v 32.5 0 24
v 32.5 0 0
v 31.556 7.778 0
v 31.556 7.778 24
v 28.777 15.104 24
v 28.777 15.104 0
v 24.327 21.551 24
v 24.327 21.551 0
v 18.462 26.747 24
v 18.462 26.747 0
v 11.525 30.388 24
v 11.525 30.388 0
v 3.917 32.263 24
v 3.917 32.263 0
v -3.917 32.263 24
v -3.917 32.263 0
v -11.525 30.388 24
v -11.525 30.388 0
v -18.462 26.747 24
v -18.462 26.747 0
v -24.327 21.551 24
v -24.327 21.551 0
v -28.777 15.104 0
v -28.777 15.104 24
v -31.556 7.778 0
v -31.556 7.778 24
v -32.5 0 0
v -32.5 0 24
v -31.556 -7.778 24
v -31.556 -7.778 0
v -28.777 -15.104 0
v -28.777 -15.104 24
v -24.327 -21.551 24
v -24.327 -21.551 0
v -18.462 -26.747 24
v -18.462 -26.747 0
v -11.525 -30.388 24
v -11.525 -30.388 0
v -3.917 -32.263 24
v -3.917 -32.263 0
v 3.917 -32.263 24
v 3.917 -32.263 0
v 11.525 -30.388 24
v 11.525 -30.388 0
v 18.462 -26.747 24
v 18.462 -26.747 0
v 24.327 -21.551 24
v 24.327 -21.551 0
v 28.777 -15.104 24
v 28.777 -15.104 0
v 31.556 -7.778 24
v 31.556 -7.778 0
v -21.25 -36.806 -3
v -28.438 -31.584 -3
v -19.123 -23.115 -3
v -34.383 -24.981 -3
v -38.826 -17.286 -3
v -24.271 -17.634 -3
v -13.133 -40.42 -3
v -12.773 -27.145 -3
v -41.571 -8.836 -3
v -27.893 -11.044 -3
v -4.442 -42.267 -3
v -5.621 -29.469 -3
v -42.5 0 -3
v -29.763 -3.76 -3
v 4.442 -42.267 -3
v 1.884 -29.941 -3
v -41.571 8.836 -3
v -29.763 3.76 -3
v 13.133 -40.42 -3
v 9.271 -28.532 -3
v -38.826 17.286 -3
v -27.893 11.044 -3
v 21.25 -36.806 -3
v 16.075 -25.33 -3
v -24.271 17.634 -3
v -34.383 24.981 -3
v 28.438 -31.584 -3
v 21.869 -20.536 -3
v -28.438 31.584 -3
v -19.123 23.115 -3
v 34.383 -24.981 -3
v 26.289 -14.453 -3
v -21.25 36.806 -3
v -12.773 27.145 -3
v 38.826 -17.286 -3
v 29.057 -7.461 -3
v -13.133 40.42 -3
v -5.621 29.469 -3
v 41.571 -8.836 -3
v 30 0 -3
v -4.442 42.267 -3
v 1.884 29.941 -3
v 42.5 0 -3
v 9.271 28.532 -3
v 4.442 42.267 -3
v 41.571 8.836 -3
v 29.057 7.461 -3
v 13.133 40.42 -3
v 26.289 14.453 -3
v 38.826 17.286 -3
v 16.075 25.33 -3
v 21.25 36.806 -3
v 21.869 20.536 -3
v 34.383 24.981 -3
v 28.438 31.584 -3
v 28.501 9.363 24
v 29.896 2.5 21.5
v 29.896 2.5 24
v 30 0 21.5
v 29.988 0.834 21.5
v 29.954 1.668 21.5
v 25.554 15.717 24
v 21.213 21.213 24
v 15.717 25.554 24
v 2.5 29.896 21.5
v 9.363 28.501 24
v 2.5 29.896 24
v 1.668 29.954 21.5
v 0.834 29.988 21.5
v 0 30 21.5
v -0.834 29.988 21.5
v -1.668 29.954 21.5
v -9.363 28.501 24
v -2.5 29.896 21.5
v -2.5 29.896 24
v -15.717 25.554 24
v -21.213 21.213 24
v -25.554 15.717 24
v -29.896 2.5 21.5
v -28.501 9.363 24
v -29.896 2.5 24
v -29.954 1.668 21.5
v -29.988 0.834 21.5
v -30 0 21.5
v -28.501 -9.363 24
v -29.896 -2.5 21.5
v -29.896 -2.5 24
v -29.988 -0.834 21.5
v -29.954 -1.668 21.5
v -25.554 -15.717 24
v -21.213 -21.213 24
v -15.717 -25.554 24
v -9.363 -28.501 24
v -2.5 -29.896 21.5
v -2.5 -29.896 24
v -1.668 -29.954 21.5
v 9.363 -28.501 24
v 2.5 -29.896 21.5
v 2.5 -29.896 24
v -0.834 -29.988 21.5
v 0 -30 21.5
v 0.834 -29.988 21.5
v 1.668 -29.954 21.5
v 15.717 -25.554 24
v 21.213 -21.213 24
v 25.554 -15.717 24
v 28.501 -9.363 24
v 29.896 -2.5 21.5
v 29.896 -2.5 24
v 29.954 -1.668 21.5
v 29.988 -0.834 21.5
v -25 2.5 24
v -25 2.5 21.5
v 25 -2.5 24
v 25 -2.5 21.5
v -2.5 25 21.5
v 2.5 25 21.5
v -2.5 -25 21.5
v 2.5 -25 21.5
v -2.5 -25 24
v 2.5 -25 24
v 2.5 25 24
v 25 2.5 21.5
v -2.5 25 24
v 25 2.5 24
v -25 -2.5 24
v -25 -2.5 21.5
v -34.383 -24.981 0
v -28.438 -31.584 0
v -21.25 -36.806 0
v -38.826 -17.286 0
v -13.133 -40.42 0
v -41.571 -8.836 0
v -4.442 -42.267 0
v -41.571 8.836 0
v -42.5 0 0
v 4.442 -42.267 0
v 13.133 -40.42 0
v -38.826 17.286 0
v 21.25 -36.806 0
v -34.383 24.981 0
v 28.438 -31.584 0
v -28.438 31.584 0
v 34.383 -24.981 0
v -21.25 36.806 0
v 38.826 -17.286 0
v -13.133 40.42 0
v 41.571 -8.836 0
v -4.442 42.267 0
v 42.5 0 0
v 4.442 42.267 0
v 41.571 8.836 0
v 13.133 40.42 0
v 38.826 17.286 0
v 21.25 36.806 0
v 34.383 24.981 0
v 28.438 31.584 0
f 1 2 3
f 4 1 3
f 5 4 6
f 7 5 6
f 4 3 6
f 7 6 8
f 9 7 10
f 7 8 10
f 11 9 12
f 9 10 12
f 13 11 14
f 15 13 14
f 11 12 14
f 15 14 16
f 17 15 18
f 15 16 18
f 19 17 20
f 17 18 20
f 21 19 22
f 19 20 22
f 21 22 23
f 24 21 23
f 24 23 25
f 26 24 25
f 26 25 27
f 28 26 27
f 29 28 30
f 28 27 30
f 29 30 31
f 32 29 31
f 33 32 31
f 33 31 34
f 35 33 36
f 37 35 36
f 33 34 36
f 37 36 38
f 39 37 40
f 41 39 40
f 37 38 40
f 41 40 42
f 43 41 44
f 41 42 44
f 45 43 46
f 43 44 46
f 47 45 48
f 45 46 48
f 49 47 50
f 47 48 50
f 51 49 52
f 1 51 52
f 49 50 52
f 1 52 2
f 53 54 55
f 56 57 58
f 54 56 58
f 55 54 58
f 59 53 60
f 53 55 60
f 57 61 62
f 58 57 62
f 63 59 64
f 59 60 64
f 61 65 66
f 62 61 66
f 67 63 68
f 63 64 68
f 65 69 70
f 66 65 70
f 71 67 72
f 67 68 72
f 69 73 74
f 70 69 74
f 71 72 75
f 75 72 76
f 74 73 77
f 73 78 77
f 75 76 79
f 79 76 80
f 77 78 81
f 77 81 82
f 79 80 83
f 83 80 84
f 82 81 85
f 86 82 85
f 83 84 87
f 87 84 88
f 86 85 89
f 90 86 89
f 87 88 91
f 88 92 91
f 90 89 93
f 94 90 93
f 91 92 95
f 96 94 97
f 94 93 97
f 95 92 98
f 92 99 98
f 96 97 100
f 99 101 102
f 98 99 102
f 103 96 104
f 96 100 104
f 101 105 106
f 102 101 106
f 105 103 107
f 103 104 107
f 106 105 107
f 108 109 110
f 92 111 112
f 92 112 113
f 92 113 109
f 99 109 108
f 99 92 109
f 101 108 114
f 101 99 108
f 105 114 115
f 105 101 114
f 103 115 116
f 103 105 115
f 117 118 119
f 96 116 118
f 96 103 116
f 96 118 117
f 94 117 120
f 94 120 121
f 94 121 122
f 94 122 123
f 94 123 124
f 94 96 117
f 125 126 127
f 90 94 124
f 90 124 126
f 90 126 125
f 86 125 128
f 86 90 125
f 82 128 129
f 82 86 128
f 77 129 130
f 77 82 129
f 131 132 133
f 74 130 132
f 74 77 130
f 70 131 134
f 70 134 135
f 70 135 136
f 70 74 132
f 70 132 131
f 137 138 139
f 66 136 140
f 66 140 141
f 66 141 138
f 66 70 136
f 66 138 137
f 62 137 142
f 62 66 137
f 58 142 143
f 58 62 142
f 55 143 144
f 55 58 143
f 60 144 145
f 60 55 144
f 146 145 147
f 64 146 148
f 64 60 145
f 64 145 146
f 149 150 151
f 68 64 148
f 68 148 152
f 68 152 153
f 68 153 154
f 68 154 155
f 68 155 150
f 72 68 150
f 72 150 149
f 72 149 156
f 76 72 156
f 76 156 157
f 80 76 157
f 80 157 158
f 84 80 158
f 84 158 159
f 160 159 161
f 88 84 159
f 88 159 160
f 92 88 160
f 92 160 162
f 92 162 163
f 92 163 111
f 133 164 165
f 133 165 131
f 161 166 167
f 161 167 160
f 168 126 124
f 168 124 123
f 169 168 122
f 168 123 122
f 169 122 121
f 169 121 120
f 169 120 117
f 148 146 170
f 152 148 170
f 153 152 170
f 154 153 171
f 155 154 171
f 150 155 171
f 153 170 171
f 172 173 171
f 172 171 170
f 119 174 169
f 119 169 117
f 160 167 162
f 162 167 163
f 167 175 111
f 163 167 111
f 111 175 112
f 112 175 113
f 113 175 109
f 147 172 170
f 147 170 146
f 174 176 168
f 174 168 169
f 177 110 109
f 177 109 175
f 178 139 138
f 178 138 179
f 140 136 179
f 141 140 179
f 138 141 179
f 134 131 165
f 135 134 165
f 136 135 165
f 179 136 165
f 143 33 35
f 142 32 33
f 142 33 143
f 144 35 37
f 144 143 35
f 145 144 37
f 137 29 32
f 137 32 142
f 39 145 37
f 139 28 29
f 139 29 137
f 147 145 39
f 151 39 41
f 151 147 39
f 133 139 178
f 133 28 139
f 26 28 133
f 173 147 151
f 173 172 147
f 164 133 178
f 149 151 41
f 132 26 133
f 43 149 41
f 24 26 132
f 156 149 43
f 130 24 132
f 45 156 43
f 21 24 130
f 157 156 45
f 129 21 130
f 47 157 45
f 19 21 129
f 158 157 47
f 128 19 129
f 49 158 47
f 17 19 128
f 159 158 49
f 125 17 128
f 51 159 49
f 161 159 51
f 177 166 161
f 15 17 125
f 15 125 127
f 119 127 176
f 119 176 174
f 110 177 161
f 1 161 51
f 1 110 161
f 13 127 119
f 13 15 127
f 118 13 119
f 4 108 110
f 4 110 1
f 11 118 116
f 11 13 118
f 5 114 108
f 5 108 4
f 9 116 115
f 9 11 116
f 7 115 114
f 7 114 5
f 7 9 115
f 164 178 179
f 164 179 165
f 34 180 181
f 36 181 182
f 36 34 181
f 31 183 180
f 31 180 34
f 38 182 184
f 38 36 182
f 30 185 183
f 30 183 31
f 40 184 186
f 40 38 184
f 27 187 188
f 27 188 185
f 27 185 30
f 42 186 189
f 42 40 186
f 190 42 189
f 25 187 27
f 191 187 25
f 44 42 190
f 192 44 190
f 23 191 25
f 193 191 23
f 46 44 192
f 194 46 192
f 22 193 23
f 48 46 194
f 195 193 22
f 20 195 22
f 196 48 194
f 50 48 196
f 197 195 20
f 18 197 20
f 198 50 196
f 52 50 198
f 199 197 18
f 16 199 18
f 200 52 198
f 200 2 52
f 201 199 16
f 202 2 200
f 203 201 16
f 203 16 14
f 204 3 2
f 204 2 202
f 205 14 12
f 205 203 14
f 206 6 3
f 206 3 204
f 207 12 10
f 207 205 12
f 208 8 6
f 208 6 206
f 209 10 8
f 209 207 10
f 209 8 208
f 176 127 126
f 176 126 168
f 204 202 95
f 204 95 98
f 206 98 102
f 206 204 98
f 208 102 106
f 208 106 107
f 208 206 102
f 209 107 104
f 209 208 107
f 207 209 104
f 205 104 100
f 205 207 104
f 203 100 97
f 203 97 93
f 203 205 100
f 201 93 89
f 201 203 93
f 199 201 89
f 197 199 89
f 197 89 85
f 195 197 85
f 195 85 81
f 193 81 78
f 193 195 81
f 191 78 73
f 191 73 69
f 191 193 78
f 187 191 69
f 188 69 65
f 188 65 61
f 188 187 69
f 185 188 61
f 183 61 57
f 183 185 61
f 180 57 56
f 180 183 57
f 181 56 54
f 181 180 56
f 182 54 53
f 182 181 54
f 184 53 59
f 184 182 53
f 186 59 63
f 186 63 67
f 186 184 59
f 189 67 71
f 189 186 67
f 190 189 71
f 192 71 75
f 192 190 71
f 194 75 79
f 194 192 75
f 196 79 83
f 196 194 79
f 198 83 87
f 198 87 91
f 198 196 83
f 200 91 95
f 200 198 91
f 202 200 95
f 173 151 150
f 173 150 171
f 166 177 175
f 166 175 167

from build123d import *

# Parameters (mm, degrees)
F0_R     = 42.5
F0_R_2   = 32.5
F0_R_3   = 30
F1_DEPTH = 3
F2_DEPTH = 24
F4_DEPTH = 2.5


with BuildPart() as f1:
    # F0 (on Top) → F1 (new body)
    with BuildSketch(Plane.XY):
        Circle(F0_R)
        Circle(F0_R_2, mode=Mode.SUBTRACT)
        Circle(F0_R_2)
        Circle(F0_R_3, mode=Mode.SUBTRACT)
    extrude(amount=-F1_DEPTH)

    # F0 (on Top) → F2 (join)
    with BuildSketch(Plane.XY):
        Circle(F0_R_2)
        Circle(F0_R_3, mode=Mode.SUBTRACT)
    extrude(amount=F2_DEPTH)

    # F3 (on face) → F4 (join)
    with BuildSketch(Plane.XY.offset(24)):
        with BuildLine():
            Line((25, -2.5), (29.8956518578, -2.5))
            ThreePointArc((29.8956518578, -2.5), (29.9739016123, -1.2510883797), (30, 0))
            ThreePointArc((30, 0), (29.9739016123, 1.2510883797), (29.8956518578, 2.5))
            Line((29.8956518578, 2.5), (25, 2.5))
            Line((25, 2.5), (25, -2.5))
        make_face()
        with BuildLine():
            ThreePointArc((-30, 0), (-29.9739016123, -1.2510883797), (-29.8956518578, -2.5))
            Line((-29.8956518578, -2.5), (-25, -2.5))
            Line((-25, -2.5), (-25, 2.5))
            Line((-25, 2.5), (-29.8956518578, 2.5))
            ThreePointArc((-29.8956518578, 2.5), (-29.9739016123, 1.2510883797), (-30, 0))
        make_face()
        with BuildLine():
            Line((2.5, 25), (2.5, 29.8956518578))
            ThreePointArc((2.5, 29.8956518578), (1.2510883797, 29.9739016123), (0, 30))
            ThreePointArc((0, 30), (-1.2510883797, 29.9739016123), (-2.5, 29.8956518578))
            Line((-2.5, 29.8956518578), (-2.5, 25))
            Line((-2.5, 25), (2.5, 25))
        make_face()
        with BuildLine():
            ThreePointArc((0, -30), (1.2510883797, -29.9739016123), (2.5, -29.8956518578))
            Line((2.5, -29.8956518578), (2.5, -25))
            Line((2.5, -25), (-2.5, -25))
            Line((-2.5, -25), (-2.5, -29.8956518578))
            ThreePointArc((-2.5, -29.8956518578), (-1.2510883797, -29.9739016123), (0, -30))
        make_face()
    extrude(amount=-F4_DEPTH)


solid = f1.part
